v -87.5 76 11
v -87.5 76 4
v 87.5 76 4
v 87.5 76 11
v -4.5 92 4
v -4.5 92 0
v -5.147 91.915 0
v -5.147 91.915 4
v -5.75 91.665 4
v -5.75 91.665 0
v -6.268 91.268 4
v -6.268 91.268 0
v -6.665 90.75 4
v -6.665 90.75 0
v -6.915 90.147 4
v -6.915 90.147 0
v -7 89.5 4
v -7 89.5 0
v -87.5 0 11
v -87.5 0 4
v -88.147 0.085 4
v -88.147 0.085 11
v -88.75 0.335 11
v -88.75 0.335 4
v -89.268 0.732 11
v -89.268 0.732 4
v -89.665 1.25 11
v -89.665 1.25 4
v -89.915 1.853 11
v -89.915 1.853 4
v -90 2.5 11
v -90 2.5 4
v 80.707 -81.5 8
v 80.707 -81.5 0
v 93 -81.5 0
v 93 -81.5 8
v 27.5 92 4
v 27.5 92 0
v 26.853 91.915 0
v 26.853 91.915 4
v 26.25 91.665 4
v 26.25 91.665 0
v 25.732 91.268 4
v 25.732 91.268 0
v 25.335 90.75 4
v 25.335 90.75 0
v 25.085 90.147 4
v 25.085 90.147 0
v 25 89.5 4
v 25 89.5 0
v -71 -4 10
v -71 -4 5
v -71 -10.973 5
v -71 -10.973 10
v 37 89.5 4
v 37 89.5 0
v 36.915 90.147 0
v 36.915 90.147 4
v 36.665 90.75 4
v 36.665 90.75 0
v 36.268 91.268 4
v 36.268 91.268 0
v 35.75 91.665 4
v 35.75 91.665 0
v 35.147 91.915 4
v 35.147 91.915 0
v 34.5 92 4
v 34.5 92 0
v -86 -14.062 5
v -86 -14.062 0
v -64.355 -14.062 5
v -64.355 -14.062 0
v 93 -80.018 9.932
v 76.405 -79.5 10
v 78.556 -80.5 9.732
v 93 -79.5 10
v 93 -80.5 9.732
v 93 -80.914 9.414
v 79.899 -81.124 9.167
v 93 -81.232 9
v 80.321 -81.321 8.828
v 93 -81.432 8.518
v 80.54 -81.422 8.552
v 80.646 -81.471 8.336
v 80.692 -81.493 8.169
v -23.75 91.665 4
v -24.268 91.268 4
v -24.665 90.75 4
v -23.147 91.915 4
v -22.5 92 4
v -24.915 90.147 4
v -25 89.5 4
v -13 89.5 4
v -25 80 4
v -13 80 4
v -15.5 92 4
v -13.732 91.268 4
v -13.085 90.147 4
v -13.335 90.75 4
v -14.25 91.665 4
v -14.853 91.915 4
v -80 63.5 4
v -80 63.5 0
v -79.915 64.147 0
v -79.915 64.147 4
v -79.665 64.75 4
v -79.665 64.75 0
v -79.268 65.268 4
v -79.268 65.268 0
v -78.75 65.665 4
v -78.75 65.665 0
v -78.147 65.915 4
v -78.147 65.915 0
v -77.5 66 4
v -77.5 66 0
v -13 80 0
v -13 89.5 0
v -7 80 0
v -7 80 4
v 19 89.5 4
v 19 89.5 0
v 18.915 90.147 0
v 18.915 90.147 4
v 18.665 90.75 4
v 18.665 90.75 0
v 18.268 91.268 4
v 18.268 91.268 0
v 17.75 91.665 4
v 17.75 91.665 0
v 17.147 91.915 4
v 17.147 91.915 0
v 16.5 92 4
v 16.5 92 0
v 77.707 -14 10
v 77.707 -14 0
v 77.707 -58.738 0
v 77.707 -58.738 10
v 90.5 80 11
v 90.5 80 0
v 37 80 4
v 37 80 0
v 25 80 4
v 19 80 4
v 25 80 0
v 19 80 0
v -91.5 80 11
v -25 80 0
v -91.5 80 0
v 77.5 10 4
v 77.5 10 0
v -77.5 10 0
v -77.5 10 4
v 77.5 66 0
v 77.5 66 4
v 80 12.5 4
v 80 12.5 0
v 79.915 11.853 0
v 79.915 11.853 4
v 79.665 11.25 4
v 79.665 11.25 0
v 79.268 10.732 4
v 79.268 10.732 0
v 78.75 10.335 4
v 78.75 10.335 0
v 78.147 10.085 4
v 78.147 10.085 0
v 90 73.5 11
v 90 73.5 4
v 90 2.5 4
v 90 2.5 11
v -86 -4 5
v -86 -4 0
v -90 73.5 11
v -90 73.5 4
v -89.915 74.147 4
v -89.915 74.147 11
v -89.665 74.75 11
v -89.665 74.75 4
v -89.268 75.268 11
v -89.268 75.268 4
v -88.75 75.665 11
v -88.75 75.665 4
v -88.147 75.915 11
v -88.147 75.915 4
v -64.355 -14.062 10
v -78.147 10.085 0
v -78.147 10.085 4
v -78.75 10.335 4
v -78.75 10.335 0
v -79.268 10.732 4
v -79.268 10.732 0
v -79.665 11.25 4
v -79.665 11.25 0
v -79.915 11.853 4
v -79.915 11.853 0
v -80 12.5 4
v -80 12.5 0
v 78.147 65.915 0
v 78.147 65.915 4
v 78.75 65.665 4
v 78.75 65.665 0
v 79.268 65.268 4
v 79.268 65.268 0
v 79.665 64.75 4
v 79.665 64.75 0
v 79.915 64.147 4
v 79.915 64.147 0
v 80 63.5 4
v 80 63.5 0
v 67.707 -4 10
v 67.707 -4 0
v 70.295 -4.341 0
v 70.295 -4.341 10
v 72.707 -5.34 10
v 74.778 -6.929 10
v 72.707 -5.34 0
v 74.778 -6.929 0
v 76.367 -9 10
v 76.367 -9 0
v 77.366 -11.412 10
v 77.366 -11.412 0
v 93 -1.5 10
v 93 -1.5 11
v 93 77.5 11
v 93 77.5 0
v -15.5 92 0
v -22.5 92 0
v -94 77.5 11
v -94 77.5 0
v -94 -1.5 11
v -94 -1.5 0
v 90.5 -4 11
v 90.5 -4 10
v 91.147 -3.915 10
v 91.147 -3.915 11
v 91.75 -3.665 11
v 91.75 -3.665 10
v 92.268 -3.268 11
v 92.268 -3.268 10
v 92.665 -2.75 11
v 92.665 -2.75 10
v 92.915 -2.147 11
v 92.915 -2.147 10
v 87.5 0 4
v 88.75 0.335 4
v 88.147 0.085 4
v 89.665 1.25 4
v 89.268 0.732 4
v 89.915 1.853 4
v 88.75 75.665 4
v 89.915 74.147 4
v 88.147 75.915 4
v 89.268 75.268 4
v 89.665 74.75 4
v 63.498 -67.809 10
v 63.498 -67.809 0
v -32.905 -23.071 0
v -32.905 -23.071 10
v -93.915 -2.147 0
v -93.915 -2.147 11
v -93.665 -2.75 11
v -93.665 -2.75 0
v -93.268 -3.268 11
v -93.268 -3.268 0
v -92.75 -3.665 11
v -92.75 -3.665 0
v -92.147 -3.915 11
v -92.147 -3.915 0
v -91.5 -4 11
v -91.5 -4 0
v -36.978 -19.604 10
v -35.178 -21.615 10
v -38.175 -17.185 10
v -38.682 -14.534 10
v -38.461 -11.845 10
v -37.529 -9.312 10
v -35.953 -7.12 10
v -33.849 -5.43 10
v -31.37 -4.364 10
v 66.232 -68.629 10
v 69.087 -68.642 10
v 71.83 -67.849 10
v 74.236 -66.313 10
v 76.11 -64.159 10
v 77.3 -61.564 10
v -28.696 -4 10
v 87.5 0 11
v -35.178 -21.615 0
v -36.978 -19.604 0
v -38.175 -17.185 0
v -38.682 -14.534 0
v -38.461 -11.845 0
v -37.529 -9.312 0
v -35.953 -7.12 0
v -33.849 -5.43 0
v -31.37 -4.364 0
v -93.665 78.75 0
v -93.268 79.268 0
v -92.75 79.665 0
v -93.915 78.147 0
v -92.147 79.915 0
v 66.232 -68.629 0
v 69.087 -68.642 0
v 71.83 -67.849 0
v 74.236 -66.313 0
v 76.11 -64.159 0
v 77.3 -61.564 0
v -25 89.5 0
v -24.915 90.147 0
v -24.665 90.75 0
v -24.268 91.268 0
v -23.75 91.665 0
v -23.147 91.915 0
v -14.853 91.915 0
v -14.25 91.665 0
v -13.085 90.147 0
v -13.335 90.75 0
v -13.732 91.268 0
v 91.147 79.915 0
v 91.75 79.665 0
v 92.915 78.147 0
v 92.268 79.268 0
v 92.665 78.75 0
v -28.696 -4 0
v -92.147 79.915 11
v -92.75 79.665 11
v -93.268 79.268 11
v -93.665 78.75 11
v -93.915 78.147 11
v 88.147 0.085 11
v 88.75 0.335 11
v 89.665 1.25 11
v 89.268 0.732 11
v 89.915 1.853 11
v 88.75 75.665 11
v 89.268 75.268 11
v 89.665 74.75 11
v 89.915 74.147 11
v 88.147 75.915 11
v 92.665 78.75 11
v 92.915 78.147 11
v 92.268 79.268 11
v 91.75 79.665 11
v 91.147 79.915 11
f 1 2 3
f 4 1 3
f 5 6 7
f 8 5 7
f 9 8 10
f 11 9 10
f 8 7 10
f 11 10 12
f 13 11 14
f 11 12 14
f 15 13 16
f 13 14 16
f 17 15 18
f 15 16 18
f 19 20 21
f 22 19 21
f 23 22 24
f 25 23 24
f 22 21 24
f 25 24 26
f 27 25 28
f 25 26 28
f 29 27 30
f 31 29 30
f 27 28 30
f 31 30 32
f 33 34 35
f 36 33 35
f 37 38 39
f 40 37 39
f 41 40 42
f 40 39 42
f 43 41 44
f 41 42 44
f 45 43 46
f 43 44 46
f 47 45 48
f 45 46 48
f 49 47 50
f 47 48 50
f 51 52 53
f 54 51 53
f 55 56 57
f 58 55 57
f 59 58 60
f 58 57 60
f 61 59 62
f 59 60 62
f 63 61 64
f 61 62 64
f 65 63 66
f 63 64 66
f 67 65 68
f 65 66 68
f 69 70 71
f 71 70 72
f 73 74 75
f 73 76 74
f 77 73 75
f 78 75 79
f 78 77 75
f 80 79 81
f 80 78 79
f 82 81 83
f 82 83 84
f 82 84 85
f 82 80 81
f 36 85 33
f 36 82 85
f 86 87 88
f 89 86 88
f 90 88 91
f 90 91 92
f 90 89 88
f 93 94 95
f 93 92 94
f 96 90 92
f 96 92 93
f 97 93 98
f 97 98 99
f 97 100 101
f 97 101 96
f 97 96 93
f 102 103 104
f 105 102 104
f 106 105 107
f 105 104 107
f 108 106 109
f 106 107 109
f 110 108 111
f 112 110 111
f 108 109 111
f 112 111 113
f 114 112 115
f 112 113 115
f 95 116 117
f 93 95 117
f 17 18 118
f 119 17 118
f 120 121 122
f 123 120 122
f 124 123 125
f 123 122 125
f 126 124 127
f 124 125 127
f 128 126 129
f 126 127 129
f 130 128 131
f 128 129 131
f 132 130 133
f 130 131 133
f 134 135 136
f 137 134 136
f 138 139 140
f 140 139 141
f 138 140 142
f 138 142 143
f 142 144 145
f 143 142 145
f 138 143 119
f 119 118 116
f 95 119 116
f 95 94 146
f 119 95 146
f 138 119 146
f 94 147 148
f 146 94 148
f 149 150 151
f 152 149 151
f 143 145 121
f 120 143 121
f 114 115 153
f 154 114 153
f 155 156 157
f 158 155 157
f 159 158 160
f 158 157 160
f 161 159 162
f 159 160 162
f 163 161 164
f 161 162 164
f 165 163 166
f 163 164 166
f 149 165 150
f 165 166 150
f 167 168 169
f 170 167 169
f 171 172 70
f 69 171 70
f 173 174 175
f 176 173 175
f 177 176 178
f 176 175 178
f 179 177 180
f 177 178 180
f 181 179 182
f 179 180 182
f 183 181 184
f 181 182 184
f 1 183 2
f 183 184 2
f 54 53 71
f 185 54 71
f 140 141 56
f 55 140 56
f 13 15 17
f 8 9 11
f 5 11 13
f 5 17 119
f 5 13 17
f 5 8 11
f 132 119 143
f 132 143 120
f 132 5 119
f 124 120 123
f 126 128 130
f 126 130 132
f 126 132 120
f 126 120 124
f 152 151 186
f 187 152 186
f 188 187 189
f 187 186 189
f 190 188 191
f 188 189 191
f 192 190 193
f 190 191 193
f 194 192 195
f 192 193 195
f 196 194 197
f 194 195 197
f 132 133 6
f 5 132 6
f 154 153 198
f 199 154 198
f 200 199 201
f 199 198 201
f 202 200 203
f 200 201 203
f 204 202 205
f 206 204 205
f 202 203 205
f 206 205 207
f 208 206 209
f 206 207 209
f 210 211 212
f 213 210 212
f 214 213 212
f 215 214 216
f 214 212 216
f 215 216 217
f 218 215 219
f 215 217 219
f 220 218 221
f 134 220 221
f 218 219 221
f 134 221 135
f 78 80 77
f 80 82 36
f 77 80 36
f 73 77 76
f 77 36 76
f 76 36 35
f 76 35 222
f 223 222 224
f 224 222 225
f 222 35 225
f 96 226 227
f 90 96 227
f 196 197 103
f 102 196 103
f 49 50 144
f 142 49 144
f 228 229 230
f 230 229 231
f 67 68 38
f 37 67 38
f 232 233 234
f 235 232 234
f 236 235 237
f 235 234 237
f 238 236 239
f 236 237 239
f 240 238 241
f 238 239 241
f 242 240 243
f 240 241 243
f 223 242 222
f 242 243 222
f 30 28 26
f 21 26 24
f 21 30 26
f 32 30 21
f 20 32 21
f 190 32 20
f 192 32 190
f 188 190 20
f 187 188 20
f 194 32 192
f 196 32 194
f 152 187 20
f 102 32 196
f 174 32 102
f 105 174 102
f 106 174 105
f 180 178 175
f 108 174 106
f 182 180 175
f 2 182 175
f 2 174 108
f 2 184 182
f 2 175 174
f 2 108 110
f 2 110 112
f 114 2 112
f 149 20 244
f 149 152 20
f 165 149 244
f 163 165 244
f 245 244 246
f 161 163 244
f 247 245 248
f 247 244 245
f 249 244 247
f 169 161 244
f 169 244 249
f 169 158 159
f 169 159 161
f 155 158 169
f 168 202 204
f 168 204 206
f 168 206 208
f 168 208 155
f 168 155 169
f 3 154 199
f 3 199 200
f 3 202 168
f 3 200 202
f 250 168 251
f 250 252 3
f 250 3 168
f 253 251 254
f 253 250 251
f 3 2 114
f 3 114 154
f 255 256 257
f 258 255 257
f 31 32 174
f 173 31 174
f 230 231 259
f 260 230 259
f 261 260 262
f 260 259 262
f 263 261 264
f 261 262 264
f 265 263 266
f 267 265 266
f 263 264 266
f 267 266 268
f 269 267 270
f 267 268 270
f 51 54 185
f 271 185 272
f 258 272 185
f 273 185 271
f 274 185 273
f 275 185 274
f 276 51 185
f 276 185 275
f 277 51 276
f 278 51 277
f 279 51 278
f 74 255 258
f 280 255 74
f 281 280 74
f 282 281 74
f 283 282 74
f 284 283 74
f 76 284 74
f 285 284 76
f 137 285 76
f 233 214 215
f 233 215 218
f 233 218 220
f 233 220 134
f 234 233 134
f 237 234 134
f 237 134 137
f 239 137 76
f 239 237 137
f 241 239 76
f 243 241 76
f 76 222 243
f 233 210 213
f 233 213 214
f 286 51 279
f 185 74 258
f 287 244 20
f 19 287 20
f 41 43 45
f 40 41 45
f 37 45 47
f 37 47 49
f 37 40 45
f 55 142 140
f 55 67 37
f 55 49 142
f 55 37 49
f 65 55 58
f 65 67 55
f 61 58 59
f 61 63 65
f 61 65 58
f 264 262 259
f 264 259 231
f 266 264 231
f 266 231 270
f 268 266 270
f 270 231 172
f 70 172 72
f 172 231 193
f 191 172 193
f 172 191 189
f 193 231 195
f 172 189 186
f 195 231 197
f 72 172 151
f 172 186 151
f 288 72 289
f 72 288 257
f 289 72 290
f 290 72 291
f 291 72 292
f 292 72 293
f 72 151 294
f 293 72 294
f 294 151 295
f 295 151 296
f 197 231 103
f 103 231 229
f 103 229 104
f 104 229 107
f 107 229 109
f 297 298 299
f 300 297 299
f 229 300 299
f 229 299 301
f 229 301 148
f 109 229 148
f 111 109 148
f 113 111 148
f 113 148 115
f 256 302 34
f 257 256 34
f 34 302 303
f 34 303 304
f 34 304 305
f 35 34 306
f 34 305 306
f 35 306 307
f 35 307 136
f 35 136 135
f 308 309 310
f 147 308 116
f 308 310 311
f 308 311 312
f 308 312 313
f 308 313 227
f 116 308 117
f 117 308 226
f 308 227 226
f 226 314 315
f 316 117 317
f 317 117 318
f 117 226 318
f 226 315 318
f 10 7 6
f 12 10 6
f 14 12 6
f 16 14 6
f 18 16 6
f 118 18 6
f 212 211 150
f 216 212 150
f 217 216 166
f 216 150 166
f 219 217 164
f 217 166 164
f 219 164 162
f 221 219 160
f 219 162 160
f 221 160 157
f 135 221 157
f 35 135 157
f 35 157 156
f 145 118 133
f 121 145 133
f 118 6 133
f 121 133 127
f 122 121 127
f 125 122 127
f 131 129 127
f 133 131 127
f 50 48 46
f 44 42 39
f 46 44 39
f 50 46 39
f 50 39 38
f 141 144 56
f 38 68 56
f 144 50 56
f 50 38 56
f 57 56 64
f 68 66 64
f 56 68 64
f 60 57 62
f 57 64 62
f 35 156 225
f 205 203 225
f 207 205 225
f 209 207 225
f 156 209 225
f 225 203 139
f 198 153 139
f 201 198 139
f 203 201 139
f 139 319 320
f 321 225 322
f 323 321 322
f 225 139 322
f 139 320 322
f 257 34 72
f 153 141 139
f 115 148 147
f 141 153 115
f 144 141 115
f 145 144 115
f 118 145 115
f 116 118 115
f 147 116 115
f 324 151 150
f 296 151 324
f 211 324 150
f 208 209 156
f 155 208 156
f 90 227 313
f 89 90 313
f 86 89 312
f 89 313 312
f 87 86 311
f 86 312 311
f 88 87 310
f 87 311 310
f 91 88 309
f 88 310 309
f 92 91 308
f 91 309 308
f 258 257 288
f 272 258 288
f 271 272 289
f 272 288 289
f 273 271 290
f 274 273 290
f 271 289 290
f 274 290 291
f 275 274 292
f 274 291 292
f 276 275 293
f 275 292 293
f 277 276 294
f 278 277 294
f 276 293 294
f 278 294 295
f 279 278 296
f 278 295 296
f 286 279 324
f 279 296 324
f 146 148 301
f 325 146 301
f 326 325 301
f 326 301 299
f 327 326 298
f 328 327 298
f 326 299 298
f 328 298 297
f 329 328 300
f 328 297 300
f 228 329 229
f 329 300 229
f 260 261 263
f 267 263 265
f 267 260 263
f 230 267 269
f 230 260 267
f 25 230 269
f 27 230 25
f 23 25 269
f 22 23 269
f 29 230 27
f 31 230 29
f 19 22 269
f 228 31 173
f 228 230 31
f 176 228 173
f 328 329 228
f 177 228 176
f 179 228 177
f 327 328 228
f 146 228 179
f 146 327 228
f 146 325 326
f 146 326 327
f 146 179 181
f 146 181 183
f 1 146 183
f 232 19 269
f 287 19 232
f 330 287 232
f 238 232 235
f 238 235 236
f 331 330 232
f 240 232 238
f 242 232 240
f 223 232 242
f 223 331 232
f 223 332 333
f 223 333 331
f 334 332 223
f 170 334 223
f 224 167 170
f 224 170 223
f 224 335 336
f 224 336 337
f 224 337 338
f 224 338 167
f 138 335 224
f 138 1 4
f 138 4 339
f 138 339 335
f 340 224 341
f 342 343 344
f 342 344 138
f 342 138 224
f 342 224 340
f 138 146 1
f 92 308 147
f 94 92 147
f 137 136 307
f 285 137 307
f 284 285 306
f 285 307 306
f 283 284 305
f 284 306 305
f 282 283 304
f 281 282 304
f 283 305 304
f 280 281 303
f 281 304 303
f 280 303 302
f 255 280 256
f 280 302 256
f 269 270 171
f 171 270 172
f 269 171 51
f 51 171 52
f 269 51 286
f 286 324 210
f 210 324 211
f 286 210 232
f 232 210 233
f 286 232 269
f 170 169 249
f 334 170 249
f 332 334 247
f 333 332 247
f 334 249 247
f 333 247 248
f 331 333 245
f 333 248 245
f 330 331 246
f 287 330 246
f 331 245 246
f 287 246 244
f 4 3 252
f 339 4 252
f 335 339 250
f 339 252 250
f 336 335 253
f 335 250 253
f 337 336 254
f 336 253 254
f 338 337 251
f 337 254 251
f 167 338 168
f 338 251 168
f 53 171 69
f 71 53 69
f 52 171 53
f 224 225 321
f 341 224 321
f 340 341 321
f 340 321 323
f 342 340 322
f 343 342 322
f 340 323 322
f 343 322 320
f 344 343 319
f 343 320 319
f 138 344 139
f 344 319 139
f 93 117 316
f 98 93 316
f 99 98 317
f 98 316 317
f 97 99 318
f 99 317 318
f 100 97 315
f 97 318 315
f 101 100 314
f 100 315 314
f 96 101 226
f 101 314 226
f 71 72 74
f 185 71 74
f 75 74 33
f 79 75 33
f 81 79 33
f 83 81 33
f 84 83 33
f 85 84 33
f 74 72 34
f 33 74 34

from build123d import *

# Parameters (mm, degrees)
F1_DEPTH = 11
F2_DEPTH = 4
F3_DEPTH = 10
F4_DEPTH = 5
F5_R     = 2


# Not quite as in the source:
# - a feature names something its author has since deleted; it is built from what else it names


with BuildPart() as f1:
    # F0 (on Top) → F1 (new body)
    with BuildSketch(Plane.XY):
        with BuildLine():
            ThreePointArc((93, 77.5), (92.267766953, 79.267766953), (90.5, 80))
            Line((90.5, 80), (37, 80))
            Line((37, 80), (25, 80))
            Line((25, 80), (19, 80))
            Line((19, 80), (-7, 80))
            Line((-7, 80), (-13, 80))
            Line((-13, 80), (-25, 80))
            Line((-25, 80), (-74, 80))
            Line((-74, 80), (-91.5, 80))
            ThreePointArc((-91.5, 80), (-93.267766953, 79.267766953), (-94, 77.5))
            Line((-94, 77.5), (-94, 76))
            Line((-94, 76), (-94, 0))
            Line((-94, 0), (-94, -1.5))
            ThreePointArc((-94, -1.5), (-93.267766953, -3.267766953), (-91.5, -4))
            Line((-91.5, -4), (-88, -4))
            Line((-88, -4), (-86, -4))
            Line((-86, -4), (-71, -4))
            Line((-71, -4), (-28.6959191337, -4))
            Line((-28.6959191337, -4), (67.7072161436, -4))
            Line((67.7072161436, -4), (88, -4))
            Line((88, -4), (90.5, -4))
            ThreePointArc((90.5, -4), (92.267766953, -3.267766953), (93, -1.5))
            Line((93, -1.5), (93, 0))
            Line((93, 0), (93, 76))
            Line((93, 76), (93, 77.5))
        make_face()
        with BuildLine():
            ThreePointArc((90, 2.5), (89.267766953, 0.732233047), (87.5, 0))
            Line((87.5, 0), (-87.5, 0))
            ThreePointArc((-87.5, 0), (-89.267766953, 0.732233047), (-90, 2.5))
            Line((-90, 2.5), (-90, 73.5))
            ThreePointArc((-90, 73.5), (-89.267766953, 75.267766953), (-87.5, 76))
            Line((-87.5, 76), (87.5, 76))
            ThreePointArc((87.5, 76), (89.267766953, 75.267766953), (90, 73.5))
            Line((90, 73.5), (90, 2.5))
        make_face(mode=Mode.SUBTRACT)
    extrude(amount=F1_DEPTH)

    # F0 (on Top) → F2 (join)
    with BuildSketch(Plane.XY):
        with BuildLine():
            Line((-87.5, 0), (87.5, 0))
            ThreePointArc((87.5, 0), (89.267766953, 0.732233047), (90, 2.5))
            Line((90, 2.5), (90, 73.5))
            ThreePointArc((90, 73.5), (89.267766953, 75.267766953), (87.5, 76))
            Line((87.5, 76), (-87.5, 76))
            ThreePointArc((-87.5, 76), (-89.267766953, 75.267766953), (-90, 73.5))
            Line((-90, 73.5), (-90, 2.5))
            ThreePointArc((-90, 2.5), (-89.267766953, 0.732233047), (-87.5, 0))
        make_face()
        with BuildLine():
            Line((-77.5, 66), (77.5, 66))
            ThreePointArc((77.5, 66), (79.267766953, 65.267766953), (80, 63.5))
            Line((80, 63.5), (80, 12.5))
            ThreePointArc((80, 12.5), (79.267766953, 10.732233047), (77.5, 10))
            Line((77.5, 10), (-77.5, 10))
            ThreePointArc((-77.5, 10), (-79.267766953, 10.732233047), (-80, 12.5))
            Line((-80, 12.5), (-80, 63.5))
            ThreePointArc((-80, 63.5), (-79.267766953, 65.267766953), (-77.5, 66))
        make_face(mode=Mode.SUBTRACT)
        with BuildLine():
            Line((-25, 80), (-13, 80))
            Line((-13, 80), (-13, 89.5))
            ThreePointArc((-13, 89.5), (-13.732233047, 91.267766953), (-15.5, 92))
            Line((-15.5, 92), (-22.5, 92))
            ThreePointArc((-22.5, 92), (-24.267766953, 91.267766953), (-25, 89.5))
            Line((-25, 89.5), (-25, 80))
        make_face()
        with BuildLine():
            Line((-7, 80), (19, 80))
            Line((19, 80), (19, 89.5))
            ThreePointArc((19, 89.5), (18.267766953, 91.267766953), (16.5, 92))
            Line((16.5, 92), (-4.5, 92))
            ThreePointArc((-4.5, 92), (-6.267766953, 91.267766953), (-7, 89.5))
            Line((-7, 89.5), (-7, 80))
        make_face()
        with BuildLine():
            Line((25, 80), (37, 80))
            Line((37, 80), (37, 89.5))
            ThreePointArc((37, 89.5), (36.267766953, 91.267766953), (34.5, 92))
            Line((34.5, 92), (27.5, 92))
            ThreePointArc((27.5, 92), (25.732233047, 91.267766953), (25, 89.5))
            Line((25, 89.5), (25, 80))
        make_face()
    extrude(amount=F2_DEPTH)

    # F0 (on Top) → F3 (join)
    with BuildSketch(Plane.XY):
        with BuildLine():
            Line((93, -81.5), (93, -1.5))
            ThreePointArc((93, -1.5), (92.267766953, -3.267766953), (90.5, -4))
            Line((90.5, -4), (88, -4))
            Line((88, -4), (67.7072161436, -4))
            ThreePointArc((67.7072161436, -4), (74.7782839555, -6.9289321881), (77.7072161436, -14))
            Line((77.7072161436, -14), (77.7072161436, -58.7379819401))
            ThreePointArc((77.7072161436, -58.7379819401), (73.0879609173, -67.1669549309), (63.4976990076, -67.8088124137))
            Line((63.4976990076, -67.8088124137), (-32.9054362697, -23.0708304737))
            ThreePointArc((-32.9054362697, -23.0708304737), (-38.4608642113, -11.8445771571), (-28.6959191337, -4))
            Line((-28.6959191337, -4), (-71, -4))
            Line((-71, -4), (-71, -10.9733034172))
            Line((-71, -10.9733034172), (-64.3552474564, -14.0623617917))
            Line((-64.3552474564, -14.0623617917), (80.7072161436, -81.5))
            Line((80.7072161436, -81.5), (93, -81.5))
        make_face()
    extrude(amount=F3_DEPTH)

    # F0 (on Top) → F4 (join)
    with BuildSketch(Plane.XY):
        Polygon((-71, -14.0623617917), (-71, -10.9733034172), (-86, -4), (-86, -14.0623617917), align=None)
        Polygon((-86, -4), (-71, -10.9733034172), (-71, -4), align=None)
        Polygon((-71, -14.0623617917), (-64.3552474564, -14.0623617917), (-71, -10.9733034172), align=None)
    extrude(amount=F4_DEPTH)

    # F5
    f5_edges = [f1.edges().sort_by_distance(p)[0] for p in [
        (86.853608, -81.5, 10),
    ]]
    fillet(f5_edges, radius=F5_R)


solid = f1.part
